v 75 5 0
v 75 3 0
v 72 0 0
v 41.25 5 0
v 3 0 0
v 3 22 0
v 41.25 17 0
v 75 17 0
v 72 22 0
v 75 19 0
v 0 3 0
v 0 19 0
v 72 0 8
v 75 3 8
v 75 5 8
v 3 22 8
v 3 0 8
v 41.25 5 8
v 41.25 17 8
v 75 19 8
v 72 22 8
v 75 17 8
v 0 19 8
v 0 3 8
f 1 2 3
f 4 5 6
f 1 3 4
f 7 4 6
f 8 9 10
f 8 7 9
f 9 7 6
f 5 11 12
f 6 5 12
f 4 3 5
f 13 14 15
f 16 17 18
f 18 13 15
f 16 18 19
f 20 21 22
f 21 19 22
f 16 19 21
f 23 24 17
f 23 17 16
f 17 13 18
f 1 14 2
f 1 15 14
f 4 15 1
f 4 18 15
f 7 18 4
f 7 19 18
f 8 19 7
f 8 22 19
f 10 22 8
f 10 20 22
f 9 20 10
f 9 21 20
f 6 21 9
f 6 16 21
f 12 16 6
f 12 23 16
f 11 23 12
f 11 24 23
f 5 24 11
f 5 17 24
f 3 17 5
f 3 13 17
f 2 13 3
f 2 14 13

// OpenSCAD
$fn = 32;

// ----------------------------------------------------------------------
// C washer: 75 x 22 mm plate with an open slot
// ----------------------------------------------------------------------

// --- parameters (mm) ---
profile_height = 8;       // extrusion height
profile_points = 12;      // points of the closed outline

profile = [[3, 0], [72, 0], [75, 3], [75, 5], [41.25, 5], [41.25, 17], [75, 17], [75, 19], [72, 22], [3, 22], [0, 19], [0, 3]];  // single closed polygon, 12 points, counter clockwise

// --- the one profile operation ---
linear_extrude(height = profile_height) polygon(points = profile);
